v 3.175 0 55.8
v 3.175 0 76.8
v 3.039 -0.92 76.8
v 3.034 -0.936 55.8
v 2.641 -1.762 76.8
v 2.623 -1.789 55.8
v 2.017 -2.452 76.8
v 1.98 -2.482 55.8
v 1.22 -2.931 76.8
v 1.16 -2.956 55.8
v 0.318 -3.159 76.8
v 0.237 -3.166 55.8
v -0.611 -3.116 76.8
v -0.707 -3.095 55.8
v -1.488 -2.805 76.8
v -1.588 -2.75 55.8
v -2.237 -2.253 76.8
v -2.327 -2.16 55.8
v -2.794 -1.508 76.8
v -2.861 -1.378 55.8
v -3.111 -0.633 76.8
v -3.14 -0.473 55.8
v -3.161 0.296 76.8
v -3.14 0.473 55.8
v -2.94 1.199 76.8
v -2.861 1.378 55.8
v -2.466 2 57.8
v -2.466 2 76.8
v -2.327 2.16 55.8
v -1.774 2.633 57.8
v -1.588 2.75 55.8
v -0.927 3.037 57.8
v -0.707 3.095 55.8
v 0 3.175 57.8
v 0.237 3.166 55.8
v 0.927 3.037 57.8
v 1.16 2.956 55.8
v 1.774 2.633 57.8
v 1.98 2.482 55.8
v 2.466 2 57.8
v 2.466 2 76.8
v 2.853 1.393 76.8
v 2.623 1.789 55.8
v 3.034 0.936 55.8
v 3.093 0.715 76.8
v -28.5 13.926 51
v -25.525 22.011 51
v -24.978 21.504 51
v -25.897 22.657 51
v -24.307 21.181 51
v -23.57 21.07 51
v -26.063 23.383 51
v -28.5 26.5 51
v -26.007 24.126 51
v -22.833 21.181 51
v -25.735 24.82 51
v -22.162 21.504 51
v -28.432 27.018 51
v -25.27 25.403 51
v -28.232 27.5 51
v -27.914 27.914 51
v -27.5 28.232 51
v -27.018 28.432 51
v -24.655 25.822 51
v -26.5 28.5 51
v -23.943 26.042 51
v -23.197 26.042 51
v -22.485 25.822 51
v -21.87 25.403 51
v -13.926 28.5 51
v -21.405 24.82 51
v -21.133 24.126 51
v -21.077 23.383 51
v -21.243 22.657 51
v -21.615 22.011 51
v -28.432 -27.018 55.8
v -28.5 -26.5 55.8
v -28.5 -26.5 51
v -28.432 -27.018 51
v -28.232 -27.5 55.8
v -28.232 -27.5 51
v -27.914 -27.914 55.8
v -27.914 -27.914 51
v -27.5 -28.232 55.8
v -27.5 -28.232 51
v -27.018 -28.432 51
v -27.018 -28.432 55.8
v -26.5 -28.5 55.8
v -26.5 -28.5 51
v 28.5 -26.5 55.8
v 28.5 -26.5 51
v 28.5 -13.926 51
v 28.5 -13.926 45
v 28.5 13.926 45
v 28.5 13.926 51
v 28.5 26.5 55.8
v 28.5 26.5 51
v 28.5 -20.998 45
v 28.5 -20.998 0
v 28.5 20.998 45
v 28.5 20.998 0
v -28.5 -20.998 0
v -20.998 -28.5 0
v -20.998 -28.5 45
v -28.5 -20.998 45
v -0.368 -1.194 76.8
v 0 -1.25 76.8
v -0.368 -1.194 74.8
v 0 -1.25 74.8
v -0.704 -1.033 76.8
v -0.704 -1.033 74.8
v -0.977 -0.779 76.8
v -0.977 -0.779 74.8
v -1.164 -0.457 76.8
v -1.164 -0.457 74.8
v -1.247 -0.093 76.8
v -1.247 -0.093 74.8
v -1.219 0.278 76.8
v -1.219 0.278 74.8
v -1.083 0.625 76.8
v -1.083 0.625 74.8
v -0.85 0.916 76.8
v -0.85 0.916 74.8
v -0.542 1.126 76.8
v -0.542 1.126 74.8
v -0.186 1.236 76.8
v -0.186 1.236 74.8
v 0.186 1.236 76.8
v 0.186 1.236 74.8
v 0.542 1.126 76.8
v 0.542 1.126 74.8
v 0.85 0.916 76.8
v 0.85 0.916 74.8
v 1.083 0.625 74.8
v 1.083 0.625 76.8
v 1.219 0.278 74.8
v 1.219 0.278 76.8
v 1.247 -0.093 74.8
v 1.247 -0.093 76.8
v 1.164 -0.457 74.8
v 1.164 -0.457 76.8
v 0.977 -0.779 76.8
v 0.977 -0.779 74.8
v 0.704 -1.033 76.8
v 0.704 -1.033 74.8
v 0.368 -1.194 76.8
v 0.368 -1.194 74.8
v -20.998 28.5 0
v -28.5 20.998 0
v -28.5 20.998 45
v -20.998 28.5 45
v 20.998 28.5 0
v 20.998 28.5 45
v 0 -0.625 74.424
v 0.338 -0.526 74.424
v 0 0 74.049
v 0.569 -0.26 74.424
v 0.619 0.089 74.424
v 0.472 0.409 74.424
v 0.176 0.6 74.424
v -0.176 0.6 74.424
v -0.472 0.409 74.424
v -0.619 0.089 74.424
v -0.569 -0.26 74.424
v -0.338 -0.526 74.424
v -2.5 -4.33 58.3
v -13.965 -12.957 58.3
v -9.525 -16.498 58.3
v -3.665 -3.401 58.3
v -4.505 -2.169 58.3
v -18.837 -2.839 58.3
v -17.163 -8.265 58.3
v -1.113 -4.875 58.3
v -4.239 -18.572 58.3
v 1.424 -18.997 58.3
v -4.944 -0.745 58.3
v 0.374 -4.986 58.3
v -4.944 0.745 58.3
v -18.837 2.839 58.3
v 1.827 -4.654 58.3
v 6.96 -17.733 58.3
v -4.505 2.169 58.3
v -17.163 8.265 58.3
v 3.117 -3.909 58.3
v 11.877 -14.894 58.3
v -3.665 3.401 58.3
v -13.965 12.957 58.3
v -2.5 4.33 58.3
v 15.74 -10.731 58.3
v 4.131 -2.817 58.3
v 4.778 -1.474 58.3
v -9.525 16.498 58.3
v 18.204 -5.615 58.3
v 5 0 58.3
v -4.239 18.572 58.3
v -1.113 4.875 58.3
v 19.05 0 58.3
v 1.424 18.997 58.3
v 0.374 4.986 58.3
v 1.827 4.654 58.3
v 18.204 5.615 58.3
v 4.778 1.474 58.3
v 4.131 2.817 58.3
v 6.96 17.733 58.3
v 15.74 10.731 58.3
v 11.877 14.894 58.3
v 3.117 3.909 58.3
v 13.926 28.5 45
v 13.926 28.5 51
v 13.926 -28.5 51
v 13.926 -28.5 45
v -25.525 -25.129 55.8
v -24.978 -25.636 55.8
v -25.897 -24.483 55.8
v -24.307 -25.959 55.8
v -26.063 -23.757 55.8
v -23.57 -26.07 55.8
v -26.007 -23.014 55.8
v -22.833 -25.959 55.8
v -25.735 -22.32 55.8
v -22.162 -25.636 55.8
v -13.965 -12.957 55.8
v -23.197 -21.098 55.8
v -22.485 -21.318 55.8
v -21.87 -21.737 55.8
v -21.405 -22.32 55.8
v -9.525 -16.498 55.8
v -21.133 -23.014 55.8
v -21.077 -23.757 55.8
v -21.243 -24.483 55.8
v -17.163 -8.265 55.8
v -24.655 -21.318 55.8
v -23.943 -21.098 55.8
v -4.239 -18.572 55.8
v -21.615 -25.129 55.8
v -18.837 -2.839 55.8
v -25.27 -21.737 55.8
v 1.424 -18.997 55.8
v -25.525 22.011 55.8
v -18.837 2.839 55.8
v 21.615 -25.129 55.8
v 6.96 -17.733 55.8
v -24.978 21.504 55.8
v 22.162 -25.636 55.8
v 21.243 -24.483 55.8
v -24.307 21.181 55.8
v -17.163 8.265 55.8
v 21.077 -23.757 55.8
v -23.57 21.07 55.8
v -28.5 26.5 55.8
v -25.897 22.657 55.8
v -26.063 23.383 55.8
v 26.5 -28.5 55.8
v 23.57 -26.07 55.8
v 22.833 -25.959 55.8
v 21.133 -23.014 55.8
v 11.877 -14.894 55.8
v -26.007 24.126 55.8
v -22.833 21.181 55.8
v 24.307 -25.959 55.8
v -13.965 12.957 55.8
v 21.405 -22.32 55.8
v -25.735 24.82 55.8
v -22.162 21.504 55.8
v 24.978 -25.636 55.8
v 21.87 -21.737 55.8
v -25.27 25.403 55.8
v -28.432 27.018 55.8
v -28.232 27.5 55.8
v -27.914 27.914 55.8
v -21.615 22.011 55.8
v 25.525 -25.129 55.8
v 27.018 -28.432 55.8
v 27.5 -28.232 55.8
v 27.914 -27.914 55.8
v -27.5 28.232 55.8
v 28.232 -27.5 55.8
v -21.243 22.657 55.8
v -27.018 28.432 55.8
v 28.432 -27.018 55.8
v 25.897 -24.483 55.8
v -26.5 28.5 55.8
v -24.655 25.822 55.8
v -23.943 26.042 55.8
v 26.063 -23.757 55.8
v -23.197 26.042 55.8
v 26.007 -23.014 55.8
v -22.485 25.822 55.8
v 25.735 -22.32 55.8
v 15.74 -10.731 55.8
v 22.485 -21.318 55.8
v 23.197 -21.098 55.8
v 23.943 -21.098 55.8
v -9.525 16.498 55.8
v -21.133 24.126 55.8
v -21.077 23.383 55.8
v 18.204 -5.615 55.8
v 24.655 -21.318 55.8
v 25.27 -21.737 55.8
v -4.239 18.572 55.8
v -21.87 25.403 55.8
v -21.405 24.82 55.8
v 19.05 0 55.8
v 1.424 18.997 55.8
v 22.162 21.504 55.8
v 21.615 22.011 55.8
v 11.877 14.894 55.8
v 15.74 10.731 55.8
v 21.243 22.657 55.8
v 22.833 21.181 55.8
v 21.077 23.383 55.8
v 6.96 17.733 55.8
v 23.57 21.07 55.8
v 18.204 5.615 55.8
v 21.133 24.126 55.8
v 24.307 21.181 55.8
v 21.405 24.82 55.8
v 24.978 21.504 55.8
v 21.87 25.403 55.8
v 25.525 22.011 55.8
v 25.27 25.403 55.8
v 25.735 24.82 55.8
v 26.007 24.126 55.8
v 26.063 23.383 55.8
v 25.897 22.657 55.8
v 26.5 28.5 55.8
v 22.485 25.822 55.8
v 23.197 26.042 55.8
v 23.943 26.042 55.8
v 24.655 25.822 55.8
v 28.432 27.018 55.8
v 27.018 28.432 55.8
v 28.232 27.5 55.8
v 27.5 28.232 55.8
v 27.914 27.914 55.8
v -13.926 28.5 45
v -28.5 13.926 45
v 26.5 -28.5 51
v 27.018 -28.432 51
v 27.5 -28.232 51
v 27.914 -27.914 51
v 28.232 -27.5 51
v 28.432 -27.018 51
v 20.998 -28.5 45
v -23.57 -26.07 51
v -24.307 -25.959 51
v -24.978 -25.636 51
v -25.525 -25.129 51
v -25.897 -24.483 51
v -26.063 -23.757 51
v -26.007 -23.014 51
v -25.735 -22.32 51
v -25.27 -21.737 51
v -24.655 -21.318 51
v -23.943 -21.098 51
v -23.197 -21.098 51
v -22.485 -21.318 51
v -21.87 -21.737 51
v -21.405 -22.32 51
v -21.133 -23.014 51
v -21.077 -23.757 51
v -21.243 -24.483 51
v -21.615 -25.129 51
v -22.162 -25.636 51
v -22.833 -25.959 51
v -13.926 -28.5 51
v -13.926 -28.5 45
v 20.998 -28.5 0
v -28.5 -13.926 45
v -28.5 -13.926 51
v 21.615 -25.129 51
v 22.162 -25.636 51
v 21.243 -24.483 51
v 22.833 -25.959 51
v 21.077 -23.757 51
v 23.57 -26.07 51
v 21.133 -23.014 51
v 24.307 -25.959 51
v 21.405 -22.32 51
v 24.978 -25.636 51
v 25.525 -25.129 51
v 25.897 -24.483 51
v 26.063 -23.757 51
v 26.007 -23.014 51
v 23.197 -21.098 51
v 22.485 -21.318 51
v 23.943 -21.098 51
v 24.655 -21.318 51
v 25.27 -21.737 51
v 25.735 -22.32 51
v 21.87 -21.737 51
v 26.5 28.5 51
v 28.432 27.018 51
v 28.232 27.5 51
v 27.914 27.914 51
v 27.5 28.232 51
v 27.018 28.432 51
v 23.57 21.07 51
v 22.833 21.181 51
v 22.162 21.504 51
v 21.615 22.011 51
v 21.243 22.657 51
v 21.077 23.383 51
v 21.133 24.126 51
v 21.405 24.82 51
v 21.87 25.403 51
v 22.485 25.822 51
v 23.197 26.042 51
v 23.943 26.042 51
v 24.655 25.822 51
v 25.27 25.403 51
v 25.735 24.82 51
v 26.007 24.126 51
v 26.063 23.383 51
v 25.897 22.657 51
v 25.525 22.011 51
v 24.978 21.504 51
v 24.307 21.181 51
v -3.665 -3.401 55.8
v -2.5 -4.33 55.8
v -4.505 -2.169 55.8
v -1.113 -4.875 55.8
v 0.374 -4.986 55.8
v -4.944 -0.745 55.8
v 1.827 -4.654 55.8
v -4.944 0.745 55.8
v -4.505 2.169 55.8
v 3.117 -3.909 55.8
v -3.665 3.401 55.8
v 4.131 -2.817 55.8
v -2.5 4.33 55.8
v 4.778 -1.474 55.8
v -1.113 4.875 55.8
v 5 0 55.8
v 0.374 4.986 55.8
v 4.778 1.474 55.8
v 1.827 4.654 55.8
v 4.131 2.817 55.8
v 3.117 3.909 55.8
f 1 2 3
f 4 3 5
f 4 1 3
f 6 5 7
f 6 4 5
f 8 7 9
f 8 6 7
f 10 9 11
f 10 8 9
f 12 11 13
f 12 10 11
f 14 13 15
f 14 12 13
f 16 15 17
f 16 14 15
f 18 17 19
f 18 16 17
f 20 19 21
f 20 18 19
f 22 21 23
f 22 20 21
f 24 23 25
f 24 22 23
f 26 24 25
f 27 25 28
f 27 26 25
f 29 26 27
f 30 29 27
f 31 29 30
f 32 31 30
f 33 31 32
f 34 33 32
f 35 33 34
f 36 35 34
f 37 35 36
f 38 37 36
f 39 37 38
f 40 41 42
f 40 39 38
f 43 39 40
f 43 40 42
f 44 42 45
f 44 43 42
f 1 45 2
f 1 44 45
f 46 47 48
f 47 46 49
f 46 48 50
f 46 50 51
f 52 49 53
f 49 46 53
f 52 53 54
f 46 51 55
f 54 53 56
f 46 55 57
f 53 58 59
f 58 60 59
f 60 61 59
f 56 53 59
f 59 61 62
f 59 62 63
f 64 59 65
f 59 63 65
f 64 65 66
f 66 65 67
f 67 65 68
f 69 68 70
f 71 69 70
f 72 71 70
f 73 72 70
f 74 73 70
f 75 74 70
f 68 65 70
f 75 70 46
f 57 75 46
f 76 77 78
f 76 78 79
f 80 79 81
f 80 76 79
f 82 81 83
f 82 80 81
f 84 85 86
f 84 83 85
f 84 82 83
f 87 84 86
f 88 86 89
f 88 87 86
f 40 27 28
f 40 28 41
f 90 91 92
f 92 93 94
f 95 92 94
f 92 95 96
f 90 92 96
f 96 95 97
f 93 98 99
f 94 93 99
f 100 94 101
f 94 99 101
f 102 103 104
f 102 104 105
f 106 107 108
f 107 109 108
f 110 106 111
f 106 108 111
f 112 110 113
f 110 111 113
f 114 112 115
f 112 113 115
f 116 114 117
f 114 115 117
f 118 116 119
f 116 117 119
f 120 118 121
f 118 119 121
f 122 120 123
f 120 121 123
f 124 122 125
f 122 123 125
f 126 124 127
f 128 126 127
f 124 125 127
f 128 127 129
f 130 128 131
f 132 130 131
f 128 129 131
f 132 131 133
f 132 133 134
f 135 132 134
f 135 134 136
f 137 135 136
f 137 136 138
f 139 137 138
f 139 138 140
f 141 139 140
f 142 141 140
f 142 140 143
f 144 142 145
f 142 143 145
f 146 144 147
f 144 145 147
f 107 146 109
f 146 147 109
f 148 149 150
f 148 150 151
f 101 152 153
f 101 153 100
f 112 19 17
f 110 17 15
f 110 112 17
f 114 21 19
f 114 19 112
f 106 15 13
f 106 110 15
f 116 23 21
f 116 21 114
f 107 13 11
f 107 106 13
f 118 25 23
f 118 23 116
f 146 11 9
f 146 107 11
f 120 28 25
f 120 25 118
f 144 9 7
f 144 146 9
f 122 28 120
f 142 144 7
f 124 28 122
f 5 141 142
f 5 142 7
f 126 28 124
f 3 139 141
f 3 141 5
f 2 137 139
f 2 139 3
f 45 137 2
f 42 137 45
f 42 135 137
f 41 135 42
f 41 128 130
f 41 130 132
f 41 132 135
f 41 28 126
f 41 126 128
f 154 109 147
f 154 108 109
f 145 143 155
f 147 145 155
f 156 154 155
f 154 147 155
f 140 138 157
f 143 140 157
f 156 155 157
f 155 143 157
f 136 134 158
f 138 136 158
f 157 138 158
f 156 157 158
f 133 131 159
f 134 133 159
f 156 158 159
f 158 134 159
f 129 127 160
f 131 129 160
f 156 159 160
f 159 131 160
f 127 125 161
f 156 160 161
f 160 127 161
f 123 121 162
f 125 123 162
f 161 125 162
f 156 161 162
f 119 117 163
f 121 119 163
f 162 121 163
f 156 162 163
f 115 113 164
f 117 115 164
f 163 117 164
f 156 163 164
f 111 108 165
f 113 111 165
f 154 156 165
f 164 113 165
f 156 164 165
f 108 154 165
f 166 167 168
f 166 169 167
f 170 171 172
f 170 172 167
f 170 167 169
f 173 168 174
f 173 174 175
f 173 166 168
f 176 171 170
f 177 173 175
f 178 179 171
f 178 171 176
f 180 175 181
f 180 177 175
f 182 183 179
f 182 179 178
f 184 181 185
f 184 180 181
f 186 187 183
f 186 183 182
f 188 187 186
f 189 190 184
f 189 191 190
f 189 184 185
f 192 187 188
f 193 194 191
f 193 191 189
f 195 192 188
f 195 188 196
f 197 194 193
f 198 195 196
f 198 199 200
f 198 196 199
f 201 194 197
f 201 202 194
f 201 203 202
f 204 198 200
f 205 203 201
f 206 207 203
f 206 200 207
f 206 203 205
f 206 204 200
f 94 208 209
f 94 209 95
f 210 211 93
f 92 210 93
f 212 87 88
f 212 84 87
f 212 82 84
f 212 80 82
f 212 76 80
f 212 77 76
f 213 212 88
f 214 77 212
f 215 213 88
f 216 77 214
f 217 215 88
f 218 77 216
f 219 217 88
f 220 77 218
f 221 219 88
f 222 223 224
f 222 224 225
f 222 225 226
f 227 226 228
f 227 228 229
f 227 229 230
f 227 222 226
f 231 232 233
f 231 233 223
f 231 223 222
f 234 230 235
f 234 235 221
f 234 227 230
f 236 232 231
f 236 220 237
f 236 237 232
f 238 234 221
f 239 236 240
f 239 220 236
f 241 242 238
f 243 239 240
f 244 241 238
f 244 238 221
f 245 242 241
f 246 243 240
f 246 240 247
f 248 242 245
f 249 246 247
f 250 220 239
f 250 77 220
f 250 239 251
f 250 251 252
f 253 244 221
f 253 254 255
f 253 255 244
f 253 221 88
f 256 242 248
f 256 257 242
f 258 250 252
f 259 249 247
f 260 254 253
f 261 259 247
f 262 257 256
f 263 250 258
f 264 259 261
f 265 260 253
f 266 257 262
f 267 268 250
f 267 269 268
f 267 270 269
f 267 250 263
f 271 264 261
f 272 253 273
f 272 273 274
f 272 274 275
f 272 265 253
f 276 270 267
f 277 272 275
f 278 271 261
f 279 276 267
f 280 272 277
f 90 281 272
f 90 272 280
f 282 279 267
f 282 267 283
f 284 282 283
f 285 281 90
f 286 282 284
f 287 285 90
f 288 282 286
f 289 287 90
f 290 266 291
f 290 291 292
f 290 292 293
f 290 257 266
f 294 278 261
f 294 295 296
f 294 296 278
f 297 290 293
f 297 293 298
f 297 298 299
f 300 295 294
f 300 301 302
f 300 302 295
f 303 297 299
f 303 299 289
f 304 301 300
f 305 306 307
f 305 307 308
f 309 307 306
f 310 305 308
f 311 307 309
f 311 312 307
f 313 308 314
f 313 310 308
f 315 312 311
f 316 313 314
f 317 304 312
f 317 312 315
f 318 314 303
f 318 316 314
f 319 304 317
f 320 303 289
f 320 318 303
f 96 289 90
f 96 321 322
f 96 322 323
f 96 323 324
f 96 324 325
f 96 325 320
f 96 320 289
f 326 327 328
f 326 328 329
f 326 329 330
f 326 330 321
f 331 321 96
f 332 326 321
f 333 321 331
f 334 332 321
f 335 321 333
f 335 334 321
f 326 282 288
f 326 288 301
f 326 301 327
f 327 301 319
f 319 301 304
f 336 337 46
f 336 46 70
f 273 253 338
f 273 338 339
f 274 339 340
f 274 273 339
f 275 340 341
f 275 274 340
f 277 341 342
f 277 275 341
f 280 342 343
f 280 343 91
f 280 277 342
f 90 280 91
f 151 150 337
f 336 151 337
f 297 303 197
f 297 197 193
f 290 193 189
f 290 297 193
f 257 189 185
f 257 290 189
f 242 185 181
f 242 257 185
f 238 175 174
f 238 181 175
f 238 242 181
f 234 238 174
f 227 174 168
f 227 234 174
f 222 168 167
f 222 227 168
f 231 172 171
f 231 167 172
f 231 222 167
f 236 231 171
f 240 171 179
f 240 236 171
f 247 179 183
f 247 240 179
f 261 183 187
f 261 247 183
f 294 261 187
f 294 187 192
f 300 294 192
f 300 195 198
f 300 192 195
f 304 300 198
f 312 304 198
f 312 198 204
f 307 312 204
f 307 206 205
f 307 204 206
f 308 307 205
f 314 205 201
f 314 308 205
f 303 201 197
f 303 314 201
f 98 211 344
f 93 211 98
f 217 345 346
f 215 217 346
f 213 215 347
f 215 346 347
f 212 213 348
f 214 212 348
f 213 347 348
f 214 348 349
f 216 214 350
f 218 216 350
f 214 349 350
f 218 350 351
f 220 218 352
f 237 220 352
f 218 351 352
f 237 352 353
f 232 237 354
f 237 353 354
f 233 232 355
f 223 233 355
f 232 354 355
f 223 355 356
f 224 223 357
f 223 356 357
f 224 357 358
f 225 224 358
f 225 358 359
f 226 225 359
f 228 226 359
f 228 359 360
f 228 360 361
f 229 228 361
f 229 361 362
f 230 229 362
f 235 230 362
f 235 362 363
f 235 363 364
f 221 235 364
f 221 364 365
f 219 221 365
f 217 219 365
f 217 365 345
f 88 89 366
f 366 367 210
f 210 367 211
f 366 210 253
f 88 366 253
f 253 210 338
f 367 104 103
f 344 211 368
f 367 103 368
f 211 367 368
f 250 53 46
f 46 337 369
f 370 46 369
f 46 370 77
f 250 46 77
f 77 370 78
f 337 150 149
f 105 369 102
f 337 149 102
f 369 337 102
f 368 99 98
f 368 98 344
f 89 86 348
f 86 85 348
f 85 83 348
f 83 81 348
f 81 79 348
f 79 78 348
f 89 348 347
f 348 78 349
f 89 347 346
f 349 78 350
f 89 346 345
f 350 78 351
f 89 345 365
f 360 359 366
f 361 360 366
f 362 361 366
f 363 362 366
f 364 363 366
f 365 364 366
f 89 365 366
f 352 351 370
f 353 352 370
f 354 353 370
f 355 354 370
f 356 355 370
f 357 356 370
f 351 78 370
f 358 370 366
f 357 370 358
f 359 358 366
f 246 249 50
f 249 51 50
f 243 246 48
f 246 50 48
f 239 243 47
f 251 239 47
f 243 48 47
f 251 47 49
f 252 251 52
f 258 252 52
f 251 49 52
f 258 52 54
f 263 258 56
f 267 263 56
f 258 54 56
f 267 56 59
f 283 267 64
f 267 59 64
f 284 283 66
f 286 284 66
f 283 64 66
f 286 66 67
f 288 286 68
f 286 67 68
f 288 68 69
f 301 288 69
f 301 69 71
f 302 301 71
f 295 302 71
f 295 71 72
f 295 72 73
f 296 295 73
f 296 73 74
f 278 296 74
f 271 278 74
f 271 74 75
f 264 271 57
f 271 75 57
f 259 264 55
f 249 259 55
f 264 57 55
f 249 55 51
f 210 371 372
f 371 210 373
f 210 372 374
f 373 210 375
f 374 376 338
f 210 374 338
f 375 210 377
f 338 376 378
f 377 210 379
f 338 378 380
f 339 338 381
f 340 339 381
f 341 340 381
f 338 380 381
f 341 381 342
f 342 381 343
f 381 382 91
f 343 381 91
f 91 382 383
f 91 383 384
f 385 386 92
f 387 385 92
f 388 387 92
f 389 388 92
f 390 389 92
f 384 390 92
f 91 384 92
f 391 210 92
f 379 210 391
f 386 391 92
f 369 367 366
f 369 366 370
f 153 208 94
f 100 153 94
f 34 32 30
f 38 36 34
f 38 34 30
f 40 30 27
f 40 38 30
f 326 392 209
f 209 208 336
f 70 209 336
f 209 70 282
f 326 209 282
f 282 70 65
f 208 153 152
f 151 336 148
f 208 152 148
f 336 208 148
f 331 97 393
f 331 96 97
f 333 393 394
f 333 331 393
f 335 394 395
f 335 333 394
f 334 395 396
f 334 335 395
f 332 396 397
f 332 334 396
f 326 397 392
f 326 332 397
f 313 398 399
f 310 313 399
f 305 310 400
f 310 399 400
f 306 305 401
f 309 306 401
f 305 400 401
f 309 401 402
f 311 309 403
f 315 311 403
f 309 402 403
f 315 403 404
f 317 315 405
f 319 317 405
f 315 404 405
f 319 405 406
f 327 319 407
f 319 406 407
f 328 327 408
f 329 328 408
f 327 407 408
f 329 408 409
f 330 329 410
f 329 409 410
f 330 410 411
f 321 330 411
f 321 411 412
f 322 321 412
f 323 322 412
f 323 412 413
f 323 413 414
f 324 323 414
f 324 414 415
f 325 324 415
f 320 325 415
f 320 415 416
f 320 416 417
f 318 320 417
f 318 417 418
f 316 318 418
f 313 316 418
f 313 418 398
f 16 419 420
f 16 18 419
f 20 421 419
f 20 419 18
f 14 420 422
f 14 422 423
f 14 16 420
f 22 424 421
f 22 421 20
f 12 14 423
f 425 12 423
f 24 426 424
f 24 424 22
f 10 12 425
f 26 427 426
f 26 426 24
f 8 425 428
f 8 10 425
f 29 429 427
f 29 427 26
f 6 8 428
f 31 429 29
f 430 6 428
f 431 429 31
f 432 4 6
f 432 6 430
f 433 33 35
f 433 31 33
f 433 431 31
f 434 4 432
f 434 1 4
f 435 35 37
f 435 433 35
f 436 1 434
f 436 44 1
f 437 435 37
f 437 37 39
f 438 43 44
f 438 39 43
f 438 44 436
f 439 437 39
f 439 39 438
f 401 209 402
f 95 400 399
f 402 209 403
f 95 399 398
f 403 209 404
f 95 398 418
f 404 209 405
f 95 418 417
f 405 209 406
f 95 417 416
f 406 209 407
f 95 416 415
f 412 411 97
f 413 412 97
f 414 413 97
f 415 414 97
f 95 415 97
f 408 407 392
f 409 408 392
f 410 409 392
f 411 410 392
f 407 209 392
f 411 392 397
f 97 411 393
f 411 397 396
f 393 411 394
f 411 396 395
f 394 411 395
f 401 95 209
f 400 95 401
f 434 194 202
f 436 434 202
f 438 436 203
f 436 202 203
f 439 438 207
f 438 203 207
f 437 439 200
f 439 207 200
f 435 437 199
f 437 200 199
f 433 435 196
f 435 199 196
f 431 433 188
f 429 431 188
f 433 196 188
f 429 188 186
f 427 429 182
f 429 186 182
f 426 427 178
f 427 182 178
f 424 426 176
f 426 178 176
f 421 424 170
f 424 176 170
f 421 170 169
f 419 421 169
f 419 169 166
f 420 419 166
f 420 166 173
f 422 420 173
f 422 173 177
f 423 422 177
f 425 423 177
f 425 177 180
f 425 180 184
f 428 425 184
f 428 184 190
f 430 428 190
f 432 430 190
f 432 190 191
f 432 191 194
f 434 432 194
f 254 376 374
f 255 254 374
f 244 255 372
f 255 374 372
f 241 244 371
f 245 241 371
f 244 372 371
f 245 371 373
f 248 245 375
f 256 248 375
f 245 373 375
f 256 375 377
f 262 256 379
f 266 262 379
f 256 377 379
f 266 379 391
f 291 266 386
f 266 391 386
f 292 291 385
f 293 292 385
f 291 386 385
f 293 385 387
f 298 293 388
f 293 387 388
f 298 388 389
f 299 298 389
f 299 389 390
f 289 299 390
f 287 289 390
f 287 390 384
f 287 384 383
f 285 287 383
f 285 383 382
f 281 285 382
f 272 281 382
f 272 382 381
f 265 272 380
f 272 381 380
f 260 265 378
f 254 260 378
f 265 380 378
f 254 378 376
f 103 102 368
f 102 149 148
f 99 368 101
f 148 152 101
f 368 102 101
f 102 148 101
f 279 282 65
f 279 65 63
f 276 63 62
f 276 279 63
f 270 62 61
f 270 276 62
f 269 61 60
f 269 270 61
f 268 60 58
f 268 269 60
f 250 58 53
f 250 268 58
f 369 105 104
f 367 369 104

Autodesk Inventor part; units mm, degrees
ref_plane "YZ Plane" through (0, 0, 0) normal (1, 0, 0) x (0, 1, 0)
ref_plane "XZ Plane" through (0, 0, 0) normal (0, 1, 0) x (-1, 0, 0)
ref_plane "XY Plane" through (0, 0, 0) normal (0, 0, 1) x (1, 0, 0)
sketch "Szkic1" plane through (0, 0, 0) normal (0, 0, 1) x (1, 0, 0)
  line L0 (-28.5, -28.5) -> (28.5, -28.5)
  line L1 (28.5, -28.5) -> (28.5, 28.5)
  line L2 (28.5, 28.5) -> (-28.5, 28.5)
  line L3 (-28.5, 28.5) -> (-28.5, -28.5)
  line L4 (-28.5, -28.5) -> (28.5, 28.5) construction
  line L5 (28.5, -28.5) -> (-28.5, 28.5) construction
  line L6 (-28.5, 20.9975) -> (-20.9975, 28.5)
  line L7 (20.9975, 28.5) -> (28.5, 20.9975)
  line L8 (28.5, -20.9975) -> (20.9975, -28.5)
  line L9 (-20.9975, -28.5) -> (-28.5, -20.9975)
  line L10 (0, 32.5269) -> (0, -32.5269) construction
  point P0 (0, 0)
  dimension "d0" = 57
  dimension "d3" = 70
  dimension "d4" = 70
extrude "Wyciągnięcie proste1" add sketch "Szkic1" along normal blind 45 contours L9 L3 L6 L2 L7 L1 L8 L0
sketch "Szkic2" plane through (0, 0, 45) normal (0, 0, 1) x (1, 0, 0)
  line L0 (20.9975, -28.5) -> (28.5, -20.9975) projected
  line L1 (28.5, -20.9975) -> (28.5, 20.9975) projected
  line L2 (28.5, 20.9975) -> (20.9975, 28.5) projected
  line L3 (20.9975, 28.5) -> (-20.9975, 28.5) projected
  line L4 (-20.9975, 28.5) -> (-28.5, 20.9975) projected
  line L5 (-28.5, 20.9975) -> (-28.5, -20.9975) projected
  line L6 (-28.5, -20.9975) -> (-20.9975, -28.5) projected
  line L7 (-20.9975, -28.5) -> (20.9975, -28.5) projected
  line L8 (20.9975, 28.5) -> (-20.9975, 28.5) projected
  line L9 (13.9264, 28.5) -> (28.5, 13.9264)
  line L10 (28.5, -20.9975) -> (28.5, 20.9975) projected
  line L11 (13.9264, -28.5) -> (28.5, -13.9264)
  line L12 (-20.9975, -28.5) -> (20.9975, -28.5) projected
  line L13 (-13.9264, -28.5) -> (-28.5, -13.9264)
  line L14 (-28.5, 20.9975) -> (-28.5, -20.9975) projected
  line L15 (-28.5, 13.9264) -> (-13.9264, 28.5)
  line L16 (-28.5, -20.9975) -> (-20.9975, -28.5) construction
  line L17 (-24.7487, -24.7487) -> (24.7487, 24.7487) construction
  line L18 (20.9975, -28.5) -> (28.5, -20.9975) construction
  line L19 (24.7487, -24.7487) -> (-24.7487, 24.7487) construction
  line L20 (-20.9975, 28.5) -> (-28.5, 20.9975) construction
  line L21 (-28.5, -20.9975) -> (-20.9975, -28.5) construction
  line L22 (28.5, 20.9975) -> (20.9975, 28.5) construction
  point P0 (0, 0)
  dimension "d7" = 60
  dimension "d8" = 60
extrude "Wyciągnięcie proste2" add sketch "Szkic2" along normal blind 6 contours L7 L13 L5 L15 L3 L9 L1 L11
sketch "Szkic3" plane through (0, 0, 51) normal (0, 0, 1) x (1, 0, 0)
  line L0 (20.9975, -28.5) -> (28.5, -20.9975) projected
  line L1 (-20.9975, -28.5) -> (20.9975, -28.5) projected
  line L2 (-28.5, -20.9975) -> (-20.9975, -28.5) projected
  line L3 (-28.5, 20.9975) -> (-28.5, -20.9975) projected
  line L4 (-20.9975, 28.5) -> (-28.5, 20.9975) projected
  line L5 (20.9975, 28.5) -> (-20.9975, 28.5) projected
  line L6 (28.5, 20.9975) -> (20.9975, 28.5) projected
  line L7 (28.5, -20.9975) -> (28.5, 20.9975) projected
  line L8 (-28.5, -28.5) -> (28.5, -28.5)
  line L9 (28.5, -28.5) -> (28.5, 28.5)
  line L10 (28.5, 28.5) -> (-28.5, 28.5)
  line L11 (-28.5, 28.5) -> (-28.5, -28.5)
  point P0 (0, 0)
  point P1 (0, 28.5)
  point P2 (28.5, 0)
  point P3 (0, -28.5)
extrude "Wyciągnięcie proste3" add sketch "Szkic3" along normal blind 4.8
sketch "Szkic4" plane through (0, 0, 55.8) normal (0, 0, 1) x (1, 0, 0)
  circle A0 centre (0, 0) radius 19.05
  dimension "d13" = 38.1
extrude "Wyciągnięcie proste4" add sketch "Szkic4" along normal blind 2.5
sketch "Szkic5" plane through (0, 0, 55.8) normal (0, 0, 1) x (1, 0, 0)
  line L0 (-23.57, -23.57) -> (23.57, -23.57) construction
  line L1 (23.57, -23.57) -> (23.57, 23.57) construction
  line L2 (23.57, 23.57) -> (-23.57, 23.57) construction
  line L3 (-23.57, 23.57) -> (-23.57, -23.57) construction
  line L4 (-23.57, -23.57) -> (23.57, 23.57) construction
  line L5 (23.57, -23.57) -> (-23.57, 23.57) construction
  point P0 (0, 0)
  dimension "d16" = 47.14
hole "Otwór1" at (-23.57, 23.57, 55.8) at (23.57, 23.57, 55.8) at (23.57, -23.57, 55.8) at (-23.57, -23.57, 55.8) direction (0, 0, -1) diameter 5 depth 5
sketch "Szkic6" plane through (0, 0, 58.3) normal (0, 0, 1) x (1, 0, 0)
  circle A0 centre (0, 0) radius 5
  dimension "d24" = 10
extrude "Wyciągnięcie proste5" cut sketch "Szkic6" against normal up to surface (2.5 mm away)
sketch "Szkic7" plane through (0, 0, 55.8) normal (0, 0, 1) x (1, 0, 0)
  circle A0 centre (0, 0) radius 5 projected
  circle A1 centre (0, 0) radius 3.175
  dimension "d27" = 6.35
extrude "Wyciągnięcie proste6" add sketch "Szkic7" along normal blind 21 contours A1
sketch "Szkic8" plane through (0, 0, 76.8) normal (0, 0, 1) x (1, 0, 0)
  circle A0 centre (0, 0) radius 3.175 projected
  line L0 (-2.4659, 2) -> (2.4659, 2)
  dimension "d30" = 2
extrude "Wyciągnięcie proste7" cut sketch "Szkic8" against normal blind 19 contours L0 A0 picked at (-0.6547, 2.1648)
sketch "Szkic9" plane through (0, 0, 76.8) normal (0, 0, 1) x (1, 0, 0)
  point P0 (0, 0)
  point P1 (0, 0)
hole "Otwór2" at (0, 0, 76.8) direction (0, 0, -1) diameter 2.5 depth 2 tip angle 118
fillet "Zaokrąglenie1" radius 2 4 edges at (28.5, -28.5, 53.4) (28.5, 28.5, 53.4) (-28.5, 28.5, 53.4) (-28.5, -28.5, 53.4)
properties part number "stepper"
